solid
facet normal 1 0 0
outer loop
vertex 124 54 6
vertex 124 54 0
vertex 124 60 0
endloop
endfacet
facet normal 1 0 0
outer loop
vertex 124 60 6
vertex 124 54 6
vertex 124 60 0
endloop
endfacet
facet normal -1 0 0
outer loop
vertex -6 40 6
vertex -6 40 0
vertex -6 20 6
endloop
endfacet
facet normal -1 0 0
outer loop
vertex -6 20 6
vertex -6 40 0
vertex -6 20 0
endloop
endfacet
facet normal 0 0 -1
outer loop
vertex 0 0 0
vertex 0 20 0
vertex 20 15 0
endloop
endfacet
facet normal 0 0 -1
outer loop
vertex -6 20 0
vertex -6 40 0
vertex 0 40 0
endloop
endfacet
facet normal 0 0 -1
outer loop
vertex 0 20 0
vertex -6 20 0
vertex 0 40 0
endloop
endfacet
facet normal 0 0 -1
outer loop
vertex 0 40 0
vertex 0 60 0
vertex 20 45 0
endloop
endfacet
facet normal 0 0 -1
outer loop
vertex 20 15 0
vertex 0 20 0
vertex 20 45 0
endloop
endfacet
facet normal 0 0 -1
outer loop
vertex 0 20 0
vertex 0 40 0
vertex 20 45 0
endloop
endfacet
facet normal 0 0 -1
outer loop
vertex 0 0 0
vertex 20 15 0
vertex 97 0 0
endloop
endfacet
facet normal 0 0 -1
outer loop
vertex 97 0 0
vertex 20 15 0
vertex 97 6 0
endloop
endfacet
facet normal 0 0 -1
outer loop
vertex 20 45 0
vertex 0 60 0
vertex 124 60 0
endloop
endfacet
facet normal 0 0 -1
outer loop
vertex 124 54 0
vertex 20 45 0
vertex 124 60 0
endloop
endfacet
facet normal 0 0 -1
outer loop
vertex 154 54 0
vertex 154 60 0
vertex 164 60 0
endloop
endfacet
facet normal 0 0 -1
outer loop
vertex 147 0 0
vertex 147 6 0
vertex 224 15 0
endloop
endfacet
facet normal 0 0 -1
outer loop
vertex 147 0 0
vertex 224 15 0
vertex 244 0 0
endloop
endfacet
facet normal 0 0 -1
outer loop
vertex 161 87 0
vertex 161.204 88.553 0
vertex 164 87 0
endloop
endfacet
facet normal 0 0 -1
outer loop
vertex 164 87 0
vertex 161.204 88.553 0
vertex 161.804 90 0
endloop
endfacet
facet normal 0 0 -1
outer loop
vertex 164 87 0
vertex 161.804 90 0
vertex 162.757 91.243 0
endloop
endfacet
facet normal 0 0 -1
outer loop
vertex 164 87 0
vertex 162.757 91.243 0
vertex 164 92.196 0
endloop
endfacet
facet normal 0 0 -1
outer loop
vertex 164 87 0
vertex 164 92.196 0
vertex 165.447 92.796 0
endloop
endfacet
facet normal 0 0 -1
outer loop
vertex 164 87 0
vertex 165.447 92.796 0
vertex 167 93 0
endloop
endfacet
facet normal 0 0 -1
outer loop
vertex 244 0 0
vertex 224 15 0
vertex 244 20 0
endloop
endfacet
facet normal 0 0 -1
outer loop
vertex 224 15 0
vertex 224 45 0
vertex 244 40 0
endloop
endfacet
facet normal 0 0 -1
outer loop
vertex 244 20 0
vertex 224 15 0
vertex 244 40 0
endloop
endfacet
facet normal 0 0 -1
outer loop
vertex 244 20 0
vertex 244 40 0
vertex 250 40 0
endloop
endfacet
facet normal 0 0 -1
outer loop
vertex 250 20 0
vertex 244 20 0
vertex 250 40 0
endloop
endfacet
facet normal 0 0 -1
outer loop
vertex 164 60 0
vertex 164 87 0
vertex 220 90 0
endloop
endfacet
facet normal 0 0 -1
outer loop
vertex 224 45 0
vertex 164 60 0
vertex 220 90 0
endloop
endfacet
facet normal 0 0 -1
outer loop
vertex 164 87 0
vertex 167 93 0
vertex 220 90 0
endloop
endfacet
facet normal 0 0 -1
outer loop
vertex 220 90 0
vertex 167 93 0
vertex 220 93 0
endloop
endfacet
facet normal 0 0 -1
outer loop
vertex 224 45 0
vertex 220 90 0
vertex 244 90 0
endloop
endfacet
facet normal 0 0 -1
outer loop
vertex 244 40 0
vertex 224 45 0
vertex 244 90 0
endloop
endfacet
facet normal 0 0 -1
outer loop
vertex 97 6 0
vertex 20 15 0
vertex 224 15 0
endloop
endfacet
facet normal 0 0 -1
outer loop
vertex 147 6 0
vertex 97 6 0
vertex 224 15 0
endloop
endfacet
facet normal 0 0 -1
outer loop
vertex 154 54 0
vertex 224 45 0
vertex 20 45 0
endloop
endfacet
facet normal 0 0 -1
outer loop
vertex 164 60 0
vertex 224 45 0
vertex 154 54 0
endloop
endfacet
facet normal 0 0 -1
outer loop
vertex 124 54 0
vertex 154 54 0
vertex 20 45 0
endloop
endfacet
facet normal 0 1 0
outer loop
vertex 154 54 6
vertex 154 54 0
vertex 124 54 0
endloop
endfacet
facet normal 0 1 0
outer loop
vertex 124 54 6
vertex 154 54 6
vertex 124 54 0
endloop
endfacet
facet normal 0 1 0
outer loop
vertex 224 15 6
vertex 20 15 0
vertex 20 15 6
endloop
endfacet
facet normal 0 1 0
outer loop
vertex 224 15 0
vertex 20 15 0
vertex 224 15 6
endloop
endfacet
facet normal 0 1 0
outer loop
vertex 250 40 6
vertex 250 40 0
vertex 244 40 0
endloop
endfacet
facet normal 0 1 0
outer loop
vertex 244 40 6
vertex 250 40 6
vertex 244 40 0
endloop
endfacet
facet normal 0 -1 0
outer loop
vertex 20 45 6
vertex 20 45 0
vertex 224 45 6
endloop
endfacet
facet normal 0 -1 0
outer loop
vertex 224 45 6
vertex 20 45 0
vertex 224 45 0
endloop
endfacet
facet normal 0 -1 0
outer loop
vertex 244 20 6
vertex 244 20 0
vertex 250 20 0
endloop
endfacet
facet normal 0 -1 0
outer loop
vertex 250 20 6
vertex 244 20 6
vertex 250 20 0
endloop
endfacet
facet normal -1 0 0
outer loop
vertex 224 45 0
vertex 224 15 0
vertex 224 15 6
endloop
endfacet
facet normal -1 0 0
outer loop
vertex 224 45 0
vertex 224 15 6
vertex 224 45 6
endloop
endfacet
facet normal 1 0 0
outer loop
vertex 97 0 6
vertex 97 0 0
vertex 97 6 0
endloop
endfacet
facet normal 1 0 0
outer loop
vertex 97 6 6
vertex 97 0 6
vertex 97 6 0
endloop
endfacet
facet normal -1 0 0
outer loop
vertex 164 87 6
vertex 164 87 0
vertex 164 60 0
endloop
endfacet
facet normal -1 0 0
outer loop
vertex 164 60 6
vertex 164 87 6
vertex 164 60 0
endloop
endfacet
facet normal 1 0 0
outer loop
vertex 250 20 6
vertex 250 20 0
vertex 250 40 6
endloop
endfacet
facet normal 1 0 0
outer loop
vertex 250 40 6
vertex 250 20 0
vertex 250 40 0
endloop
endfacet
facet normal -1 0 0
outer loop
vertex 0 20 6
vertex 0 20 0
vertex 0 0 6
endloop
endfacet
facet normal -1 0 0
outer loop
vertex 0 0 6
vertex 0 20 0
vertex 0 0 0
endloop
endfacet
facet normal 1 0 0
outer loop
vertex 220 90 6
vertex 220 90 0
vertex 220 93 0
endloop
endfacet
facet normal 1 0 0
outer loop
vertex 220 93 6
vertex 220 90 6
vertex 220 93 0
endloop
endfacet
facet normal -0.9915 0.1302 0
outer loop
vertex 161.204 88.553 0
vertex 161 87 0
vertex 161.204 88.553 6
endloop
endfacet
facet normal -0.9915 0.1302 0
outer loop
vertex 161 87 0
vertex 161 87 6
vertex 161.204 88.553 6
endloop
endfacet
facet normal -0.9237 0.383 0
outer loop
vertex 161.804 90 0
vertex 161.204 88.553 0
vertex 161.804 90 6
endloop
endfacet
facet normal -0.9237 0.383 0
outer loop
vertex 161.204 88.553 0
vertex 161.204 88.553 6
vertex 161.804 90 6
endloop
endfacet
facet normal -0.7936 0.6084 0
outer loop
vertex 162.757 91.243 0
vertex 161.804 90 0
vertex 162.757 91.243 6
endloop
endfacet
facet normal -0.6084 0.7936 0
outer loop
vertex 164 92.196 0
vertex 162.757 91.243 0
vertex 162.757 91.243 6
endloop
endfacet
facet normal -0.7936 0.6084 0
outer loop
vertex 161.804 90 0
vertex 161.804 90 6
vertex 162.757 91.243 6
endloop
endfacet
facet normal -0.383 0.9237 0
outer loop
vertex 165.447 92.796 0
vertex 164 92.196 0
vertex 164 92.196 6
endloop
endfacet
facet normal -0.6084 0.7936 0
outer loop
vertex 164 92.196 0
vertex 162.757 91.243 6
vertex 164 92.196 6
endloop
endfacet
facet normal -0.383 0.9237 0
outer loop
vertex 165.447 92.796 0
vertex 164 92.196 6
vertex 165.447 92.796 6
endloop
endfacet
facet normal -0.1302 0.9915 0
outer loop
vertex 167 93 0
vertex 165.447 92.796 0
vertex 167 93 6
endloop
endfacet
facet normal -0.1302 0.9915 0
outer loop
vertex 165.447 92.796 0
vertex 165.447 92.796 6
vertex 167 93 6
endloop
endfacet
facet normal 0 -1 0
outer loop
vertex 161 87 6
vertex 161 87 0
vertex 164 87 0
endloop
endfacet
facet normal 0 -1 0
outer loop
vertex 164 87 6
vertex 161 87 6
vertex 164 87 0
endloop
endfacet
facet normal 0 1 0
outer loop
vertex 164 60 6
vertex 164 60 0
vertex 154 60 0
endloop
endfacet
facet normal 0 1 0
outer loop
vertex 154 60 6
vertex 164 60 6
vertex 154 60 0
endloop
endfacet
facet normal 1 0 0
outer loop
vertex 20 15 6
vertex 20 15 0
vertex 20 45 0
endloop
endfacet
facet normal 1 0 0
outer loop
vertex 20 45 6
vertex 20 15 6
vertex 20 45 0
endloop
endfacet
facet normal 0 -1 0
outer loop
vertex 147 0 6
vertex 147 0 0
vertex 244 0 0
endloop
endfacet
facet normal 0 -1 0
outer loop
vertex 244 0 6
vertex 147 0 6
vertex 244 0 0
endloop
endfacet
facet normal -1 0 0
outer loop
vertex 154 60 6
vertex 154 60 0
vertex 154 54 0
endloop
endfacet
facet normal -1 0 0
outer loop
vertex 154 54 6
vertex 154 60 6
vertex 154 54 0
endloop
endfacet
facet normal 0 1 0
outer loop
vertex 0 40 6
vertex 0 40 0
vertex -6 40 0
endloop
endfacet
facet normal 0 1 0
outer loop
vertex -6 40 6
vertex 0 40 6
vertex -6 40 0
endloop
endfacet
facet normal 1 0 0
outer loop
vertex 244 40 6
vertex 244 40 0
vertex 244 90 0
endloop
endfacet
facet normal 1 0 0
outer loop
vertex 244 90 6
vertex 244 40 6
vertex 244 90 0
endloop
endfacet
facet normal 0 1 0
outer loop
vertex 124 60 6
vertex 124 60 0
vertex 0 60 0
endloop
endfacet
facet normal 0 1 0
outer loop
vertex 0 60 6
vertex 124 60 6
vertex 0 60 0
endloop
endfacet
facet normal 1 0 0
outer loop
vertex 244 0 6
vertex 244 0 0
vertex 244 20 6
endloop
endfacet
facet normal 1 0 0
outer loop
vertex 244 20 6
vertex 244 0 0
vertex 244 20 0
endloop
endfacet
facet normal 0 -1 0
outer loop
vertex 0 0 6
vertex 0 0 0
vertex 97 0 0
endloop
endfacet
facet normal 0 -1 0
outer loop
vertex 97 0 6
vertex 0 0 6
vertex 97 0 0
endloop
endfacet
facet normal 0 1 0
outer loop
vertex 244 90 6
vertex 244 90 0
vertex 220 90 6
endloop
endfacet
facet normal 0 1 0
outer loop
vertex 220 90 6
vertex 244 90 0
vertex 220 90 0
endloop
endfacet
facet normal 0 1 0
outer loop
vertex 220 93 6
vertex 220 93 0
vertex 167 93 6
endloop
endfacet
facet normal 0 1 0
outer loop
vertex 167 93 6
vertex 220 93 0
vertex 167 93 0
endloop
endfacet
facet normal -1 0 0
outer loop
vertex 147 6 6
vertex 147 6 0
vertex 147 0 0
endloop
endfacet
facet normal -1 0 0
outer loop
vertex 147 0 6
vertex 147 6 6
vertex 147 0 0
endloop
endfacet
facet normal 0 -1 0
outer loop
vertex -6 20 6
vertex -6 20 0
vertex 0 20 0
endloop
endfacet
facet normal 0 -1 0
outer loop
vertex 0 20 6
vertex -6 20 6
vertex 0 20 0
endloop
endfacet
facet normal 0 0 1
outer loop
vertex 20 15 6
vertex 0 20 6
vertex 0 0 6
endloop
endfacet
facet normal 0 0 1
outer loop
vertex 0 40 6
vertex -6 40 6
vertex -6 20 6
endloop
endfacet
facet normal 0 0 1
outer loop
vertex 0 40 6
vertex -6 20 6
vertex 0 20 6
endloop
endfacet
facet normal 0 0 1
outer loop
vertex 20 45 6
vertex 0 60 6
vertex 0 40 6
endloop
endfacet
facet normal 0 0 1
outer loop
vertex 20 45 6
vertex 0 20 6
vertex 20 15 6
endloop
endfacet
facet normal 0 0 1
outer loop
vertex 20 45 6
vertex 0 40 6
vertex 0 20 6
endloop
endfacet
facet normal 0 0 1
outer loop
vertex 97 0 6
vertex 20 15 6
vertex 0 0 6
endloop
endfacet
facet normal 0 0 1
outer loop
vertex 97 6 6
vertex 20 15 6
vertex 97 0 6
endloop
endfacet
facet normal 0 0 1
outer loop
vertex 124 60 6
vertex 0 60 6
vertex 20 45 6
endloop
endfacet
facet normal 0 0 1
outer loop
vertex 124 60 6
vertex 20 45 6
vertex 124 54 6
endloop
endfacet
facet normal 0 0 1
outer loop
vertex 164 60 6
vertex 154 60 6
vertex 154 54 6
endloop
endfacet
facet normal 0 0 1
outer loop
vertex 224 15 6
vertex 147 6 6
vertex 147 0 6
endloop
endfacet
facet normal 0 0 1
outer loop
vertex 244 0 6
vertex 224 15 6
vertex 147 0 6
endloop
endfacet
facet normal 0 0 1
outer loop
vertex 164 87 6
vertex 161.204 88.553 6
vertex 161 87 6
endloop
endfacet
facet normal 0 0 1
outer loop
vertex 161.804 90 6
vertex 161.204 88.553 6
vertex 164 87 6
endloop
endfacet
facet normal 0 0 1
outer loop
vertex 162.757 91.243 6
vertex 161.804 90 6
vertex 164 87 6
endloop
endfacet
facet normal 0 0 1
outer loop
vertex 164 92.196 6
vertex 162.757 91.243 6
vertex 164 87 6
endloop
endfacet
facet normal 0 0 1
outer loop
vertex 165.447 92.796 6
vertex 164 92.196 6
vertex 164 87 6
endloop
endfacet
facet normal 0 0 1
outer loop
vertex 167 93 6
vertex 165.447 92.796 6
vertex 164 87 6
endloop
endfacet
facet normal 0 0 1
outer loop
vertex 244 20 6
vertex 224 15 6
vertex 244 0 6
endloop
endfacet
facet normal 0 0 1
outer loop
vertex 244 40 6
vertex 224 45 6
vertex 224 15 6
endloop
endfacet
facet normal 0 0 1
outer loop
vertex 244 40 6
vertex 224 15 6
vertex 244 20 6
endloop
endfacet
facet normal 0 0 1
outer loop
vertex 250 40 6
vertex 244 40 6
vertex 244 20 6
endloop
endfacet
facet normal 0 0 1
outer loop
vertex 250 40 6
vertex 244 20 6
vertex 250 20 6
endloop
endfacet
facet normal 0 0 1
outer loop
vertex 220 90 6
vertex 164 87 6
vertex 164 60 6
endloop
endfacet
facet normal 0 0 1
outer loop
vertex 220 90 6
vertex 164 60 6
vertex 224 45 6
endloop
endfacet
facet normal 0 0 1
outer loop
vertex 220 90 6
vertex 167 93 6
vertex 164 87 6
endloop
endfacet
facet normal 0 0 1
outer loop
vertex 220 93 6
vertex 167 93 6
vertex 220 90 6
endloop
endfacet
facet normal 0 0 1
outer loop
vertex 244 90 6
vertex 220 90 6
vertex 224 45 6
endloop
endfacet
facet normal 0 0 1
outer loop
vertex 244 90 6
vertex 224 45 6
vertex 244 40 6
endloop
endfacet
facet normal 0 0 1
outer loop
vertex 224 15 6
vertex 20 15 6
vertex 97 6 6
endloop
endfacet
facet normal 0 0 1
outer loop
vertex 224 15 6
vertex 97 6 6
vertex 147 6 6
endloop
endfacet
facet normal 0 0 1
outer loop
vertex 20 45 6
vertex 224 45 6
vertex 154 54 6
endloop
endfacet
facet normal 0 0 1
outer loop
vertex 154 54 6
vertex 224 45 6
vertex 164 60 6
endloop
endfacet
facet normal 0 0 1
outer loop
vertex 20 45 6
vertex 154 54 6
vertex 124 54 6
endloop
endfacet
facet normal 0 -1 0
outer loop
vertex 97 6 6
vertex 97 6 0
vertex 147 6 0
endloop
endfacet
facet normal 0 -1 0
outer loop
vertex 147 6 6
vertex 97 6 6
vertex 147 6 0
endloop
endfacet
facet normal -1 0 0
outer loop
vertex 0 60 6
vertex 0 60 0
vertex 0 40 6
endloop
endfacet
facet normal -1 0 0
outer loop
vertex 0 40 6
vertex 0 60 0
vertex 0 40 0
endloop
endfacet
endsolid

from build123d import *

# Parameters (mm, degrees)
SKETCH_1_W      = 204
SKETCH_1_H      = 30
EXTRUDE_1_DEPTH = 6
FILLET_1_R      = 6


with BuildPart() as part:
    # Эскиз1 → Бобышка-Вытянуть1 (new body)
    with BuildSketch(Plane.XY):
        Polygon((0, 20), (0, 0), (97, 0), (97, 6), (147, 6), (147, 0), (244, 0), (244, 20), (250, 20), (250, 40), (244, 40), (244, 90), (220, 90), (220, 93), (161, 93), (161, 87), (164, 87), (164, 60), (154, 60), (154, 54), (124, 54), (124, 60), (0, 60), (0, 40), (-6, 40), (-6, 20), align=None)
        with Locations((122, 30)):
            Rectangle(SKETCH_1_W, SKETCH_1_H, mode=Mode.SUBTRACT)
    extrude(amount=EXTRUDE_1_DEPTH)

    # Скругление1
    fillet_1_edges = [part.edges().sort_by_distance(p)[0] for p in [
        (161, 93, 3),
    ]]
    fillet(fillet_1_edges, radius=FILLET_1_R - 0.0001)  # a hair under: the kernel refuses the full size


solid = part.part
